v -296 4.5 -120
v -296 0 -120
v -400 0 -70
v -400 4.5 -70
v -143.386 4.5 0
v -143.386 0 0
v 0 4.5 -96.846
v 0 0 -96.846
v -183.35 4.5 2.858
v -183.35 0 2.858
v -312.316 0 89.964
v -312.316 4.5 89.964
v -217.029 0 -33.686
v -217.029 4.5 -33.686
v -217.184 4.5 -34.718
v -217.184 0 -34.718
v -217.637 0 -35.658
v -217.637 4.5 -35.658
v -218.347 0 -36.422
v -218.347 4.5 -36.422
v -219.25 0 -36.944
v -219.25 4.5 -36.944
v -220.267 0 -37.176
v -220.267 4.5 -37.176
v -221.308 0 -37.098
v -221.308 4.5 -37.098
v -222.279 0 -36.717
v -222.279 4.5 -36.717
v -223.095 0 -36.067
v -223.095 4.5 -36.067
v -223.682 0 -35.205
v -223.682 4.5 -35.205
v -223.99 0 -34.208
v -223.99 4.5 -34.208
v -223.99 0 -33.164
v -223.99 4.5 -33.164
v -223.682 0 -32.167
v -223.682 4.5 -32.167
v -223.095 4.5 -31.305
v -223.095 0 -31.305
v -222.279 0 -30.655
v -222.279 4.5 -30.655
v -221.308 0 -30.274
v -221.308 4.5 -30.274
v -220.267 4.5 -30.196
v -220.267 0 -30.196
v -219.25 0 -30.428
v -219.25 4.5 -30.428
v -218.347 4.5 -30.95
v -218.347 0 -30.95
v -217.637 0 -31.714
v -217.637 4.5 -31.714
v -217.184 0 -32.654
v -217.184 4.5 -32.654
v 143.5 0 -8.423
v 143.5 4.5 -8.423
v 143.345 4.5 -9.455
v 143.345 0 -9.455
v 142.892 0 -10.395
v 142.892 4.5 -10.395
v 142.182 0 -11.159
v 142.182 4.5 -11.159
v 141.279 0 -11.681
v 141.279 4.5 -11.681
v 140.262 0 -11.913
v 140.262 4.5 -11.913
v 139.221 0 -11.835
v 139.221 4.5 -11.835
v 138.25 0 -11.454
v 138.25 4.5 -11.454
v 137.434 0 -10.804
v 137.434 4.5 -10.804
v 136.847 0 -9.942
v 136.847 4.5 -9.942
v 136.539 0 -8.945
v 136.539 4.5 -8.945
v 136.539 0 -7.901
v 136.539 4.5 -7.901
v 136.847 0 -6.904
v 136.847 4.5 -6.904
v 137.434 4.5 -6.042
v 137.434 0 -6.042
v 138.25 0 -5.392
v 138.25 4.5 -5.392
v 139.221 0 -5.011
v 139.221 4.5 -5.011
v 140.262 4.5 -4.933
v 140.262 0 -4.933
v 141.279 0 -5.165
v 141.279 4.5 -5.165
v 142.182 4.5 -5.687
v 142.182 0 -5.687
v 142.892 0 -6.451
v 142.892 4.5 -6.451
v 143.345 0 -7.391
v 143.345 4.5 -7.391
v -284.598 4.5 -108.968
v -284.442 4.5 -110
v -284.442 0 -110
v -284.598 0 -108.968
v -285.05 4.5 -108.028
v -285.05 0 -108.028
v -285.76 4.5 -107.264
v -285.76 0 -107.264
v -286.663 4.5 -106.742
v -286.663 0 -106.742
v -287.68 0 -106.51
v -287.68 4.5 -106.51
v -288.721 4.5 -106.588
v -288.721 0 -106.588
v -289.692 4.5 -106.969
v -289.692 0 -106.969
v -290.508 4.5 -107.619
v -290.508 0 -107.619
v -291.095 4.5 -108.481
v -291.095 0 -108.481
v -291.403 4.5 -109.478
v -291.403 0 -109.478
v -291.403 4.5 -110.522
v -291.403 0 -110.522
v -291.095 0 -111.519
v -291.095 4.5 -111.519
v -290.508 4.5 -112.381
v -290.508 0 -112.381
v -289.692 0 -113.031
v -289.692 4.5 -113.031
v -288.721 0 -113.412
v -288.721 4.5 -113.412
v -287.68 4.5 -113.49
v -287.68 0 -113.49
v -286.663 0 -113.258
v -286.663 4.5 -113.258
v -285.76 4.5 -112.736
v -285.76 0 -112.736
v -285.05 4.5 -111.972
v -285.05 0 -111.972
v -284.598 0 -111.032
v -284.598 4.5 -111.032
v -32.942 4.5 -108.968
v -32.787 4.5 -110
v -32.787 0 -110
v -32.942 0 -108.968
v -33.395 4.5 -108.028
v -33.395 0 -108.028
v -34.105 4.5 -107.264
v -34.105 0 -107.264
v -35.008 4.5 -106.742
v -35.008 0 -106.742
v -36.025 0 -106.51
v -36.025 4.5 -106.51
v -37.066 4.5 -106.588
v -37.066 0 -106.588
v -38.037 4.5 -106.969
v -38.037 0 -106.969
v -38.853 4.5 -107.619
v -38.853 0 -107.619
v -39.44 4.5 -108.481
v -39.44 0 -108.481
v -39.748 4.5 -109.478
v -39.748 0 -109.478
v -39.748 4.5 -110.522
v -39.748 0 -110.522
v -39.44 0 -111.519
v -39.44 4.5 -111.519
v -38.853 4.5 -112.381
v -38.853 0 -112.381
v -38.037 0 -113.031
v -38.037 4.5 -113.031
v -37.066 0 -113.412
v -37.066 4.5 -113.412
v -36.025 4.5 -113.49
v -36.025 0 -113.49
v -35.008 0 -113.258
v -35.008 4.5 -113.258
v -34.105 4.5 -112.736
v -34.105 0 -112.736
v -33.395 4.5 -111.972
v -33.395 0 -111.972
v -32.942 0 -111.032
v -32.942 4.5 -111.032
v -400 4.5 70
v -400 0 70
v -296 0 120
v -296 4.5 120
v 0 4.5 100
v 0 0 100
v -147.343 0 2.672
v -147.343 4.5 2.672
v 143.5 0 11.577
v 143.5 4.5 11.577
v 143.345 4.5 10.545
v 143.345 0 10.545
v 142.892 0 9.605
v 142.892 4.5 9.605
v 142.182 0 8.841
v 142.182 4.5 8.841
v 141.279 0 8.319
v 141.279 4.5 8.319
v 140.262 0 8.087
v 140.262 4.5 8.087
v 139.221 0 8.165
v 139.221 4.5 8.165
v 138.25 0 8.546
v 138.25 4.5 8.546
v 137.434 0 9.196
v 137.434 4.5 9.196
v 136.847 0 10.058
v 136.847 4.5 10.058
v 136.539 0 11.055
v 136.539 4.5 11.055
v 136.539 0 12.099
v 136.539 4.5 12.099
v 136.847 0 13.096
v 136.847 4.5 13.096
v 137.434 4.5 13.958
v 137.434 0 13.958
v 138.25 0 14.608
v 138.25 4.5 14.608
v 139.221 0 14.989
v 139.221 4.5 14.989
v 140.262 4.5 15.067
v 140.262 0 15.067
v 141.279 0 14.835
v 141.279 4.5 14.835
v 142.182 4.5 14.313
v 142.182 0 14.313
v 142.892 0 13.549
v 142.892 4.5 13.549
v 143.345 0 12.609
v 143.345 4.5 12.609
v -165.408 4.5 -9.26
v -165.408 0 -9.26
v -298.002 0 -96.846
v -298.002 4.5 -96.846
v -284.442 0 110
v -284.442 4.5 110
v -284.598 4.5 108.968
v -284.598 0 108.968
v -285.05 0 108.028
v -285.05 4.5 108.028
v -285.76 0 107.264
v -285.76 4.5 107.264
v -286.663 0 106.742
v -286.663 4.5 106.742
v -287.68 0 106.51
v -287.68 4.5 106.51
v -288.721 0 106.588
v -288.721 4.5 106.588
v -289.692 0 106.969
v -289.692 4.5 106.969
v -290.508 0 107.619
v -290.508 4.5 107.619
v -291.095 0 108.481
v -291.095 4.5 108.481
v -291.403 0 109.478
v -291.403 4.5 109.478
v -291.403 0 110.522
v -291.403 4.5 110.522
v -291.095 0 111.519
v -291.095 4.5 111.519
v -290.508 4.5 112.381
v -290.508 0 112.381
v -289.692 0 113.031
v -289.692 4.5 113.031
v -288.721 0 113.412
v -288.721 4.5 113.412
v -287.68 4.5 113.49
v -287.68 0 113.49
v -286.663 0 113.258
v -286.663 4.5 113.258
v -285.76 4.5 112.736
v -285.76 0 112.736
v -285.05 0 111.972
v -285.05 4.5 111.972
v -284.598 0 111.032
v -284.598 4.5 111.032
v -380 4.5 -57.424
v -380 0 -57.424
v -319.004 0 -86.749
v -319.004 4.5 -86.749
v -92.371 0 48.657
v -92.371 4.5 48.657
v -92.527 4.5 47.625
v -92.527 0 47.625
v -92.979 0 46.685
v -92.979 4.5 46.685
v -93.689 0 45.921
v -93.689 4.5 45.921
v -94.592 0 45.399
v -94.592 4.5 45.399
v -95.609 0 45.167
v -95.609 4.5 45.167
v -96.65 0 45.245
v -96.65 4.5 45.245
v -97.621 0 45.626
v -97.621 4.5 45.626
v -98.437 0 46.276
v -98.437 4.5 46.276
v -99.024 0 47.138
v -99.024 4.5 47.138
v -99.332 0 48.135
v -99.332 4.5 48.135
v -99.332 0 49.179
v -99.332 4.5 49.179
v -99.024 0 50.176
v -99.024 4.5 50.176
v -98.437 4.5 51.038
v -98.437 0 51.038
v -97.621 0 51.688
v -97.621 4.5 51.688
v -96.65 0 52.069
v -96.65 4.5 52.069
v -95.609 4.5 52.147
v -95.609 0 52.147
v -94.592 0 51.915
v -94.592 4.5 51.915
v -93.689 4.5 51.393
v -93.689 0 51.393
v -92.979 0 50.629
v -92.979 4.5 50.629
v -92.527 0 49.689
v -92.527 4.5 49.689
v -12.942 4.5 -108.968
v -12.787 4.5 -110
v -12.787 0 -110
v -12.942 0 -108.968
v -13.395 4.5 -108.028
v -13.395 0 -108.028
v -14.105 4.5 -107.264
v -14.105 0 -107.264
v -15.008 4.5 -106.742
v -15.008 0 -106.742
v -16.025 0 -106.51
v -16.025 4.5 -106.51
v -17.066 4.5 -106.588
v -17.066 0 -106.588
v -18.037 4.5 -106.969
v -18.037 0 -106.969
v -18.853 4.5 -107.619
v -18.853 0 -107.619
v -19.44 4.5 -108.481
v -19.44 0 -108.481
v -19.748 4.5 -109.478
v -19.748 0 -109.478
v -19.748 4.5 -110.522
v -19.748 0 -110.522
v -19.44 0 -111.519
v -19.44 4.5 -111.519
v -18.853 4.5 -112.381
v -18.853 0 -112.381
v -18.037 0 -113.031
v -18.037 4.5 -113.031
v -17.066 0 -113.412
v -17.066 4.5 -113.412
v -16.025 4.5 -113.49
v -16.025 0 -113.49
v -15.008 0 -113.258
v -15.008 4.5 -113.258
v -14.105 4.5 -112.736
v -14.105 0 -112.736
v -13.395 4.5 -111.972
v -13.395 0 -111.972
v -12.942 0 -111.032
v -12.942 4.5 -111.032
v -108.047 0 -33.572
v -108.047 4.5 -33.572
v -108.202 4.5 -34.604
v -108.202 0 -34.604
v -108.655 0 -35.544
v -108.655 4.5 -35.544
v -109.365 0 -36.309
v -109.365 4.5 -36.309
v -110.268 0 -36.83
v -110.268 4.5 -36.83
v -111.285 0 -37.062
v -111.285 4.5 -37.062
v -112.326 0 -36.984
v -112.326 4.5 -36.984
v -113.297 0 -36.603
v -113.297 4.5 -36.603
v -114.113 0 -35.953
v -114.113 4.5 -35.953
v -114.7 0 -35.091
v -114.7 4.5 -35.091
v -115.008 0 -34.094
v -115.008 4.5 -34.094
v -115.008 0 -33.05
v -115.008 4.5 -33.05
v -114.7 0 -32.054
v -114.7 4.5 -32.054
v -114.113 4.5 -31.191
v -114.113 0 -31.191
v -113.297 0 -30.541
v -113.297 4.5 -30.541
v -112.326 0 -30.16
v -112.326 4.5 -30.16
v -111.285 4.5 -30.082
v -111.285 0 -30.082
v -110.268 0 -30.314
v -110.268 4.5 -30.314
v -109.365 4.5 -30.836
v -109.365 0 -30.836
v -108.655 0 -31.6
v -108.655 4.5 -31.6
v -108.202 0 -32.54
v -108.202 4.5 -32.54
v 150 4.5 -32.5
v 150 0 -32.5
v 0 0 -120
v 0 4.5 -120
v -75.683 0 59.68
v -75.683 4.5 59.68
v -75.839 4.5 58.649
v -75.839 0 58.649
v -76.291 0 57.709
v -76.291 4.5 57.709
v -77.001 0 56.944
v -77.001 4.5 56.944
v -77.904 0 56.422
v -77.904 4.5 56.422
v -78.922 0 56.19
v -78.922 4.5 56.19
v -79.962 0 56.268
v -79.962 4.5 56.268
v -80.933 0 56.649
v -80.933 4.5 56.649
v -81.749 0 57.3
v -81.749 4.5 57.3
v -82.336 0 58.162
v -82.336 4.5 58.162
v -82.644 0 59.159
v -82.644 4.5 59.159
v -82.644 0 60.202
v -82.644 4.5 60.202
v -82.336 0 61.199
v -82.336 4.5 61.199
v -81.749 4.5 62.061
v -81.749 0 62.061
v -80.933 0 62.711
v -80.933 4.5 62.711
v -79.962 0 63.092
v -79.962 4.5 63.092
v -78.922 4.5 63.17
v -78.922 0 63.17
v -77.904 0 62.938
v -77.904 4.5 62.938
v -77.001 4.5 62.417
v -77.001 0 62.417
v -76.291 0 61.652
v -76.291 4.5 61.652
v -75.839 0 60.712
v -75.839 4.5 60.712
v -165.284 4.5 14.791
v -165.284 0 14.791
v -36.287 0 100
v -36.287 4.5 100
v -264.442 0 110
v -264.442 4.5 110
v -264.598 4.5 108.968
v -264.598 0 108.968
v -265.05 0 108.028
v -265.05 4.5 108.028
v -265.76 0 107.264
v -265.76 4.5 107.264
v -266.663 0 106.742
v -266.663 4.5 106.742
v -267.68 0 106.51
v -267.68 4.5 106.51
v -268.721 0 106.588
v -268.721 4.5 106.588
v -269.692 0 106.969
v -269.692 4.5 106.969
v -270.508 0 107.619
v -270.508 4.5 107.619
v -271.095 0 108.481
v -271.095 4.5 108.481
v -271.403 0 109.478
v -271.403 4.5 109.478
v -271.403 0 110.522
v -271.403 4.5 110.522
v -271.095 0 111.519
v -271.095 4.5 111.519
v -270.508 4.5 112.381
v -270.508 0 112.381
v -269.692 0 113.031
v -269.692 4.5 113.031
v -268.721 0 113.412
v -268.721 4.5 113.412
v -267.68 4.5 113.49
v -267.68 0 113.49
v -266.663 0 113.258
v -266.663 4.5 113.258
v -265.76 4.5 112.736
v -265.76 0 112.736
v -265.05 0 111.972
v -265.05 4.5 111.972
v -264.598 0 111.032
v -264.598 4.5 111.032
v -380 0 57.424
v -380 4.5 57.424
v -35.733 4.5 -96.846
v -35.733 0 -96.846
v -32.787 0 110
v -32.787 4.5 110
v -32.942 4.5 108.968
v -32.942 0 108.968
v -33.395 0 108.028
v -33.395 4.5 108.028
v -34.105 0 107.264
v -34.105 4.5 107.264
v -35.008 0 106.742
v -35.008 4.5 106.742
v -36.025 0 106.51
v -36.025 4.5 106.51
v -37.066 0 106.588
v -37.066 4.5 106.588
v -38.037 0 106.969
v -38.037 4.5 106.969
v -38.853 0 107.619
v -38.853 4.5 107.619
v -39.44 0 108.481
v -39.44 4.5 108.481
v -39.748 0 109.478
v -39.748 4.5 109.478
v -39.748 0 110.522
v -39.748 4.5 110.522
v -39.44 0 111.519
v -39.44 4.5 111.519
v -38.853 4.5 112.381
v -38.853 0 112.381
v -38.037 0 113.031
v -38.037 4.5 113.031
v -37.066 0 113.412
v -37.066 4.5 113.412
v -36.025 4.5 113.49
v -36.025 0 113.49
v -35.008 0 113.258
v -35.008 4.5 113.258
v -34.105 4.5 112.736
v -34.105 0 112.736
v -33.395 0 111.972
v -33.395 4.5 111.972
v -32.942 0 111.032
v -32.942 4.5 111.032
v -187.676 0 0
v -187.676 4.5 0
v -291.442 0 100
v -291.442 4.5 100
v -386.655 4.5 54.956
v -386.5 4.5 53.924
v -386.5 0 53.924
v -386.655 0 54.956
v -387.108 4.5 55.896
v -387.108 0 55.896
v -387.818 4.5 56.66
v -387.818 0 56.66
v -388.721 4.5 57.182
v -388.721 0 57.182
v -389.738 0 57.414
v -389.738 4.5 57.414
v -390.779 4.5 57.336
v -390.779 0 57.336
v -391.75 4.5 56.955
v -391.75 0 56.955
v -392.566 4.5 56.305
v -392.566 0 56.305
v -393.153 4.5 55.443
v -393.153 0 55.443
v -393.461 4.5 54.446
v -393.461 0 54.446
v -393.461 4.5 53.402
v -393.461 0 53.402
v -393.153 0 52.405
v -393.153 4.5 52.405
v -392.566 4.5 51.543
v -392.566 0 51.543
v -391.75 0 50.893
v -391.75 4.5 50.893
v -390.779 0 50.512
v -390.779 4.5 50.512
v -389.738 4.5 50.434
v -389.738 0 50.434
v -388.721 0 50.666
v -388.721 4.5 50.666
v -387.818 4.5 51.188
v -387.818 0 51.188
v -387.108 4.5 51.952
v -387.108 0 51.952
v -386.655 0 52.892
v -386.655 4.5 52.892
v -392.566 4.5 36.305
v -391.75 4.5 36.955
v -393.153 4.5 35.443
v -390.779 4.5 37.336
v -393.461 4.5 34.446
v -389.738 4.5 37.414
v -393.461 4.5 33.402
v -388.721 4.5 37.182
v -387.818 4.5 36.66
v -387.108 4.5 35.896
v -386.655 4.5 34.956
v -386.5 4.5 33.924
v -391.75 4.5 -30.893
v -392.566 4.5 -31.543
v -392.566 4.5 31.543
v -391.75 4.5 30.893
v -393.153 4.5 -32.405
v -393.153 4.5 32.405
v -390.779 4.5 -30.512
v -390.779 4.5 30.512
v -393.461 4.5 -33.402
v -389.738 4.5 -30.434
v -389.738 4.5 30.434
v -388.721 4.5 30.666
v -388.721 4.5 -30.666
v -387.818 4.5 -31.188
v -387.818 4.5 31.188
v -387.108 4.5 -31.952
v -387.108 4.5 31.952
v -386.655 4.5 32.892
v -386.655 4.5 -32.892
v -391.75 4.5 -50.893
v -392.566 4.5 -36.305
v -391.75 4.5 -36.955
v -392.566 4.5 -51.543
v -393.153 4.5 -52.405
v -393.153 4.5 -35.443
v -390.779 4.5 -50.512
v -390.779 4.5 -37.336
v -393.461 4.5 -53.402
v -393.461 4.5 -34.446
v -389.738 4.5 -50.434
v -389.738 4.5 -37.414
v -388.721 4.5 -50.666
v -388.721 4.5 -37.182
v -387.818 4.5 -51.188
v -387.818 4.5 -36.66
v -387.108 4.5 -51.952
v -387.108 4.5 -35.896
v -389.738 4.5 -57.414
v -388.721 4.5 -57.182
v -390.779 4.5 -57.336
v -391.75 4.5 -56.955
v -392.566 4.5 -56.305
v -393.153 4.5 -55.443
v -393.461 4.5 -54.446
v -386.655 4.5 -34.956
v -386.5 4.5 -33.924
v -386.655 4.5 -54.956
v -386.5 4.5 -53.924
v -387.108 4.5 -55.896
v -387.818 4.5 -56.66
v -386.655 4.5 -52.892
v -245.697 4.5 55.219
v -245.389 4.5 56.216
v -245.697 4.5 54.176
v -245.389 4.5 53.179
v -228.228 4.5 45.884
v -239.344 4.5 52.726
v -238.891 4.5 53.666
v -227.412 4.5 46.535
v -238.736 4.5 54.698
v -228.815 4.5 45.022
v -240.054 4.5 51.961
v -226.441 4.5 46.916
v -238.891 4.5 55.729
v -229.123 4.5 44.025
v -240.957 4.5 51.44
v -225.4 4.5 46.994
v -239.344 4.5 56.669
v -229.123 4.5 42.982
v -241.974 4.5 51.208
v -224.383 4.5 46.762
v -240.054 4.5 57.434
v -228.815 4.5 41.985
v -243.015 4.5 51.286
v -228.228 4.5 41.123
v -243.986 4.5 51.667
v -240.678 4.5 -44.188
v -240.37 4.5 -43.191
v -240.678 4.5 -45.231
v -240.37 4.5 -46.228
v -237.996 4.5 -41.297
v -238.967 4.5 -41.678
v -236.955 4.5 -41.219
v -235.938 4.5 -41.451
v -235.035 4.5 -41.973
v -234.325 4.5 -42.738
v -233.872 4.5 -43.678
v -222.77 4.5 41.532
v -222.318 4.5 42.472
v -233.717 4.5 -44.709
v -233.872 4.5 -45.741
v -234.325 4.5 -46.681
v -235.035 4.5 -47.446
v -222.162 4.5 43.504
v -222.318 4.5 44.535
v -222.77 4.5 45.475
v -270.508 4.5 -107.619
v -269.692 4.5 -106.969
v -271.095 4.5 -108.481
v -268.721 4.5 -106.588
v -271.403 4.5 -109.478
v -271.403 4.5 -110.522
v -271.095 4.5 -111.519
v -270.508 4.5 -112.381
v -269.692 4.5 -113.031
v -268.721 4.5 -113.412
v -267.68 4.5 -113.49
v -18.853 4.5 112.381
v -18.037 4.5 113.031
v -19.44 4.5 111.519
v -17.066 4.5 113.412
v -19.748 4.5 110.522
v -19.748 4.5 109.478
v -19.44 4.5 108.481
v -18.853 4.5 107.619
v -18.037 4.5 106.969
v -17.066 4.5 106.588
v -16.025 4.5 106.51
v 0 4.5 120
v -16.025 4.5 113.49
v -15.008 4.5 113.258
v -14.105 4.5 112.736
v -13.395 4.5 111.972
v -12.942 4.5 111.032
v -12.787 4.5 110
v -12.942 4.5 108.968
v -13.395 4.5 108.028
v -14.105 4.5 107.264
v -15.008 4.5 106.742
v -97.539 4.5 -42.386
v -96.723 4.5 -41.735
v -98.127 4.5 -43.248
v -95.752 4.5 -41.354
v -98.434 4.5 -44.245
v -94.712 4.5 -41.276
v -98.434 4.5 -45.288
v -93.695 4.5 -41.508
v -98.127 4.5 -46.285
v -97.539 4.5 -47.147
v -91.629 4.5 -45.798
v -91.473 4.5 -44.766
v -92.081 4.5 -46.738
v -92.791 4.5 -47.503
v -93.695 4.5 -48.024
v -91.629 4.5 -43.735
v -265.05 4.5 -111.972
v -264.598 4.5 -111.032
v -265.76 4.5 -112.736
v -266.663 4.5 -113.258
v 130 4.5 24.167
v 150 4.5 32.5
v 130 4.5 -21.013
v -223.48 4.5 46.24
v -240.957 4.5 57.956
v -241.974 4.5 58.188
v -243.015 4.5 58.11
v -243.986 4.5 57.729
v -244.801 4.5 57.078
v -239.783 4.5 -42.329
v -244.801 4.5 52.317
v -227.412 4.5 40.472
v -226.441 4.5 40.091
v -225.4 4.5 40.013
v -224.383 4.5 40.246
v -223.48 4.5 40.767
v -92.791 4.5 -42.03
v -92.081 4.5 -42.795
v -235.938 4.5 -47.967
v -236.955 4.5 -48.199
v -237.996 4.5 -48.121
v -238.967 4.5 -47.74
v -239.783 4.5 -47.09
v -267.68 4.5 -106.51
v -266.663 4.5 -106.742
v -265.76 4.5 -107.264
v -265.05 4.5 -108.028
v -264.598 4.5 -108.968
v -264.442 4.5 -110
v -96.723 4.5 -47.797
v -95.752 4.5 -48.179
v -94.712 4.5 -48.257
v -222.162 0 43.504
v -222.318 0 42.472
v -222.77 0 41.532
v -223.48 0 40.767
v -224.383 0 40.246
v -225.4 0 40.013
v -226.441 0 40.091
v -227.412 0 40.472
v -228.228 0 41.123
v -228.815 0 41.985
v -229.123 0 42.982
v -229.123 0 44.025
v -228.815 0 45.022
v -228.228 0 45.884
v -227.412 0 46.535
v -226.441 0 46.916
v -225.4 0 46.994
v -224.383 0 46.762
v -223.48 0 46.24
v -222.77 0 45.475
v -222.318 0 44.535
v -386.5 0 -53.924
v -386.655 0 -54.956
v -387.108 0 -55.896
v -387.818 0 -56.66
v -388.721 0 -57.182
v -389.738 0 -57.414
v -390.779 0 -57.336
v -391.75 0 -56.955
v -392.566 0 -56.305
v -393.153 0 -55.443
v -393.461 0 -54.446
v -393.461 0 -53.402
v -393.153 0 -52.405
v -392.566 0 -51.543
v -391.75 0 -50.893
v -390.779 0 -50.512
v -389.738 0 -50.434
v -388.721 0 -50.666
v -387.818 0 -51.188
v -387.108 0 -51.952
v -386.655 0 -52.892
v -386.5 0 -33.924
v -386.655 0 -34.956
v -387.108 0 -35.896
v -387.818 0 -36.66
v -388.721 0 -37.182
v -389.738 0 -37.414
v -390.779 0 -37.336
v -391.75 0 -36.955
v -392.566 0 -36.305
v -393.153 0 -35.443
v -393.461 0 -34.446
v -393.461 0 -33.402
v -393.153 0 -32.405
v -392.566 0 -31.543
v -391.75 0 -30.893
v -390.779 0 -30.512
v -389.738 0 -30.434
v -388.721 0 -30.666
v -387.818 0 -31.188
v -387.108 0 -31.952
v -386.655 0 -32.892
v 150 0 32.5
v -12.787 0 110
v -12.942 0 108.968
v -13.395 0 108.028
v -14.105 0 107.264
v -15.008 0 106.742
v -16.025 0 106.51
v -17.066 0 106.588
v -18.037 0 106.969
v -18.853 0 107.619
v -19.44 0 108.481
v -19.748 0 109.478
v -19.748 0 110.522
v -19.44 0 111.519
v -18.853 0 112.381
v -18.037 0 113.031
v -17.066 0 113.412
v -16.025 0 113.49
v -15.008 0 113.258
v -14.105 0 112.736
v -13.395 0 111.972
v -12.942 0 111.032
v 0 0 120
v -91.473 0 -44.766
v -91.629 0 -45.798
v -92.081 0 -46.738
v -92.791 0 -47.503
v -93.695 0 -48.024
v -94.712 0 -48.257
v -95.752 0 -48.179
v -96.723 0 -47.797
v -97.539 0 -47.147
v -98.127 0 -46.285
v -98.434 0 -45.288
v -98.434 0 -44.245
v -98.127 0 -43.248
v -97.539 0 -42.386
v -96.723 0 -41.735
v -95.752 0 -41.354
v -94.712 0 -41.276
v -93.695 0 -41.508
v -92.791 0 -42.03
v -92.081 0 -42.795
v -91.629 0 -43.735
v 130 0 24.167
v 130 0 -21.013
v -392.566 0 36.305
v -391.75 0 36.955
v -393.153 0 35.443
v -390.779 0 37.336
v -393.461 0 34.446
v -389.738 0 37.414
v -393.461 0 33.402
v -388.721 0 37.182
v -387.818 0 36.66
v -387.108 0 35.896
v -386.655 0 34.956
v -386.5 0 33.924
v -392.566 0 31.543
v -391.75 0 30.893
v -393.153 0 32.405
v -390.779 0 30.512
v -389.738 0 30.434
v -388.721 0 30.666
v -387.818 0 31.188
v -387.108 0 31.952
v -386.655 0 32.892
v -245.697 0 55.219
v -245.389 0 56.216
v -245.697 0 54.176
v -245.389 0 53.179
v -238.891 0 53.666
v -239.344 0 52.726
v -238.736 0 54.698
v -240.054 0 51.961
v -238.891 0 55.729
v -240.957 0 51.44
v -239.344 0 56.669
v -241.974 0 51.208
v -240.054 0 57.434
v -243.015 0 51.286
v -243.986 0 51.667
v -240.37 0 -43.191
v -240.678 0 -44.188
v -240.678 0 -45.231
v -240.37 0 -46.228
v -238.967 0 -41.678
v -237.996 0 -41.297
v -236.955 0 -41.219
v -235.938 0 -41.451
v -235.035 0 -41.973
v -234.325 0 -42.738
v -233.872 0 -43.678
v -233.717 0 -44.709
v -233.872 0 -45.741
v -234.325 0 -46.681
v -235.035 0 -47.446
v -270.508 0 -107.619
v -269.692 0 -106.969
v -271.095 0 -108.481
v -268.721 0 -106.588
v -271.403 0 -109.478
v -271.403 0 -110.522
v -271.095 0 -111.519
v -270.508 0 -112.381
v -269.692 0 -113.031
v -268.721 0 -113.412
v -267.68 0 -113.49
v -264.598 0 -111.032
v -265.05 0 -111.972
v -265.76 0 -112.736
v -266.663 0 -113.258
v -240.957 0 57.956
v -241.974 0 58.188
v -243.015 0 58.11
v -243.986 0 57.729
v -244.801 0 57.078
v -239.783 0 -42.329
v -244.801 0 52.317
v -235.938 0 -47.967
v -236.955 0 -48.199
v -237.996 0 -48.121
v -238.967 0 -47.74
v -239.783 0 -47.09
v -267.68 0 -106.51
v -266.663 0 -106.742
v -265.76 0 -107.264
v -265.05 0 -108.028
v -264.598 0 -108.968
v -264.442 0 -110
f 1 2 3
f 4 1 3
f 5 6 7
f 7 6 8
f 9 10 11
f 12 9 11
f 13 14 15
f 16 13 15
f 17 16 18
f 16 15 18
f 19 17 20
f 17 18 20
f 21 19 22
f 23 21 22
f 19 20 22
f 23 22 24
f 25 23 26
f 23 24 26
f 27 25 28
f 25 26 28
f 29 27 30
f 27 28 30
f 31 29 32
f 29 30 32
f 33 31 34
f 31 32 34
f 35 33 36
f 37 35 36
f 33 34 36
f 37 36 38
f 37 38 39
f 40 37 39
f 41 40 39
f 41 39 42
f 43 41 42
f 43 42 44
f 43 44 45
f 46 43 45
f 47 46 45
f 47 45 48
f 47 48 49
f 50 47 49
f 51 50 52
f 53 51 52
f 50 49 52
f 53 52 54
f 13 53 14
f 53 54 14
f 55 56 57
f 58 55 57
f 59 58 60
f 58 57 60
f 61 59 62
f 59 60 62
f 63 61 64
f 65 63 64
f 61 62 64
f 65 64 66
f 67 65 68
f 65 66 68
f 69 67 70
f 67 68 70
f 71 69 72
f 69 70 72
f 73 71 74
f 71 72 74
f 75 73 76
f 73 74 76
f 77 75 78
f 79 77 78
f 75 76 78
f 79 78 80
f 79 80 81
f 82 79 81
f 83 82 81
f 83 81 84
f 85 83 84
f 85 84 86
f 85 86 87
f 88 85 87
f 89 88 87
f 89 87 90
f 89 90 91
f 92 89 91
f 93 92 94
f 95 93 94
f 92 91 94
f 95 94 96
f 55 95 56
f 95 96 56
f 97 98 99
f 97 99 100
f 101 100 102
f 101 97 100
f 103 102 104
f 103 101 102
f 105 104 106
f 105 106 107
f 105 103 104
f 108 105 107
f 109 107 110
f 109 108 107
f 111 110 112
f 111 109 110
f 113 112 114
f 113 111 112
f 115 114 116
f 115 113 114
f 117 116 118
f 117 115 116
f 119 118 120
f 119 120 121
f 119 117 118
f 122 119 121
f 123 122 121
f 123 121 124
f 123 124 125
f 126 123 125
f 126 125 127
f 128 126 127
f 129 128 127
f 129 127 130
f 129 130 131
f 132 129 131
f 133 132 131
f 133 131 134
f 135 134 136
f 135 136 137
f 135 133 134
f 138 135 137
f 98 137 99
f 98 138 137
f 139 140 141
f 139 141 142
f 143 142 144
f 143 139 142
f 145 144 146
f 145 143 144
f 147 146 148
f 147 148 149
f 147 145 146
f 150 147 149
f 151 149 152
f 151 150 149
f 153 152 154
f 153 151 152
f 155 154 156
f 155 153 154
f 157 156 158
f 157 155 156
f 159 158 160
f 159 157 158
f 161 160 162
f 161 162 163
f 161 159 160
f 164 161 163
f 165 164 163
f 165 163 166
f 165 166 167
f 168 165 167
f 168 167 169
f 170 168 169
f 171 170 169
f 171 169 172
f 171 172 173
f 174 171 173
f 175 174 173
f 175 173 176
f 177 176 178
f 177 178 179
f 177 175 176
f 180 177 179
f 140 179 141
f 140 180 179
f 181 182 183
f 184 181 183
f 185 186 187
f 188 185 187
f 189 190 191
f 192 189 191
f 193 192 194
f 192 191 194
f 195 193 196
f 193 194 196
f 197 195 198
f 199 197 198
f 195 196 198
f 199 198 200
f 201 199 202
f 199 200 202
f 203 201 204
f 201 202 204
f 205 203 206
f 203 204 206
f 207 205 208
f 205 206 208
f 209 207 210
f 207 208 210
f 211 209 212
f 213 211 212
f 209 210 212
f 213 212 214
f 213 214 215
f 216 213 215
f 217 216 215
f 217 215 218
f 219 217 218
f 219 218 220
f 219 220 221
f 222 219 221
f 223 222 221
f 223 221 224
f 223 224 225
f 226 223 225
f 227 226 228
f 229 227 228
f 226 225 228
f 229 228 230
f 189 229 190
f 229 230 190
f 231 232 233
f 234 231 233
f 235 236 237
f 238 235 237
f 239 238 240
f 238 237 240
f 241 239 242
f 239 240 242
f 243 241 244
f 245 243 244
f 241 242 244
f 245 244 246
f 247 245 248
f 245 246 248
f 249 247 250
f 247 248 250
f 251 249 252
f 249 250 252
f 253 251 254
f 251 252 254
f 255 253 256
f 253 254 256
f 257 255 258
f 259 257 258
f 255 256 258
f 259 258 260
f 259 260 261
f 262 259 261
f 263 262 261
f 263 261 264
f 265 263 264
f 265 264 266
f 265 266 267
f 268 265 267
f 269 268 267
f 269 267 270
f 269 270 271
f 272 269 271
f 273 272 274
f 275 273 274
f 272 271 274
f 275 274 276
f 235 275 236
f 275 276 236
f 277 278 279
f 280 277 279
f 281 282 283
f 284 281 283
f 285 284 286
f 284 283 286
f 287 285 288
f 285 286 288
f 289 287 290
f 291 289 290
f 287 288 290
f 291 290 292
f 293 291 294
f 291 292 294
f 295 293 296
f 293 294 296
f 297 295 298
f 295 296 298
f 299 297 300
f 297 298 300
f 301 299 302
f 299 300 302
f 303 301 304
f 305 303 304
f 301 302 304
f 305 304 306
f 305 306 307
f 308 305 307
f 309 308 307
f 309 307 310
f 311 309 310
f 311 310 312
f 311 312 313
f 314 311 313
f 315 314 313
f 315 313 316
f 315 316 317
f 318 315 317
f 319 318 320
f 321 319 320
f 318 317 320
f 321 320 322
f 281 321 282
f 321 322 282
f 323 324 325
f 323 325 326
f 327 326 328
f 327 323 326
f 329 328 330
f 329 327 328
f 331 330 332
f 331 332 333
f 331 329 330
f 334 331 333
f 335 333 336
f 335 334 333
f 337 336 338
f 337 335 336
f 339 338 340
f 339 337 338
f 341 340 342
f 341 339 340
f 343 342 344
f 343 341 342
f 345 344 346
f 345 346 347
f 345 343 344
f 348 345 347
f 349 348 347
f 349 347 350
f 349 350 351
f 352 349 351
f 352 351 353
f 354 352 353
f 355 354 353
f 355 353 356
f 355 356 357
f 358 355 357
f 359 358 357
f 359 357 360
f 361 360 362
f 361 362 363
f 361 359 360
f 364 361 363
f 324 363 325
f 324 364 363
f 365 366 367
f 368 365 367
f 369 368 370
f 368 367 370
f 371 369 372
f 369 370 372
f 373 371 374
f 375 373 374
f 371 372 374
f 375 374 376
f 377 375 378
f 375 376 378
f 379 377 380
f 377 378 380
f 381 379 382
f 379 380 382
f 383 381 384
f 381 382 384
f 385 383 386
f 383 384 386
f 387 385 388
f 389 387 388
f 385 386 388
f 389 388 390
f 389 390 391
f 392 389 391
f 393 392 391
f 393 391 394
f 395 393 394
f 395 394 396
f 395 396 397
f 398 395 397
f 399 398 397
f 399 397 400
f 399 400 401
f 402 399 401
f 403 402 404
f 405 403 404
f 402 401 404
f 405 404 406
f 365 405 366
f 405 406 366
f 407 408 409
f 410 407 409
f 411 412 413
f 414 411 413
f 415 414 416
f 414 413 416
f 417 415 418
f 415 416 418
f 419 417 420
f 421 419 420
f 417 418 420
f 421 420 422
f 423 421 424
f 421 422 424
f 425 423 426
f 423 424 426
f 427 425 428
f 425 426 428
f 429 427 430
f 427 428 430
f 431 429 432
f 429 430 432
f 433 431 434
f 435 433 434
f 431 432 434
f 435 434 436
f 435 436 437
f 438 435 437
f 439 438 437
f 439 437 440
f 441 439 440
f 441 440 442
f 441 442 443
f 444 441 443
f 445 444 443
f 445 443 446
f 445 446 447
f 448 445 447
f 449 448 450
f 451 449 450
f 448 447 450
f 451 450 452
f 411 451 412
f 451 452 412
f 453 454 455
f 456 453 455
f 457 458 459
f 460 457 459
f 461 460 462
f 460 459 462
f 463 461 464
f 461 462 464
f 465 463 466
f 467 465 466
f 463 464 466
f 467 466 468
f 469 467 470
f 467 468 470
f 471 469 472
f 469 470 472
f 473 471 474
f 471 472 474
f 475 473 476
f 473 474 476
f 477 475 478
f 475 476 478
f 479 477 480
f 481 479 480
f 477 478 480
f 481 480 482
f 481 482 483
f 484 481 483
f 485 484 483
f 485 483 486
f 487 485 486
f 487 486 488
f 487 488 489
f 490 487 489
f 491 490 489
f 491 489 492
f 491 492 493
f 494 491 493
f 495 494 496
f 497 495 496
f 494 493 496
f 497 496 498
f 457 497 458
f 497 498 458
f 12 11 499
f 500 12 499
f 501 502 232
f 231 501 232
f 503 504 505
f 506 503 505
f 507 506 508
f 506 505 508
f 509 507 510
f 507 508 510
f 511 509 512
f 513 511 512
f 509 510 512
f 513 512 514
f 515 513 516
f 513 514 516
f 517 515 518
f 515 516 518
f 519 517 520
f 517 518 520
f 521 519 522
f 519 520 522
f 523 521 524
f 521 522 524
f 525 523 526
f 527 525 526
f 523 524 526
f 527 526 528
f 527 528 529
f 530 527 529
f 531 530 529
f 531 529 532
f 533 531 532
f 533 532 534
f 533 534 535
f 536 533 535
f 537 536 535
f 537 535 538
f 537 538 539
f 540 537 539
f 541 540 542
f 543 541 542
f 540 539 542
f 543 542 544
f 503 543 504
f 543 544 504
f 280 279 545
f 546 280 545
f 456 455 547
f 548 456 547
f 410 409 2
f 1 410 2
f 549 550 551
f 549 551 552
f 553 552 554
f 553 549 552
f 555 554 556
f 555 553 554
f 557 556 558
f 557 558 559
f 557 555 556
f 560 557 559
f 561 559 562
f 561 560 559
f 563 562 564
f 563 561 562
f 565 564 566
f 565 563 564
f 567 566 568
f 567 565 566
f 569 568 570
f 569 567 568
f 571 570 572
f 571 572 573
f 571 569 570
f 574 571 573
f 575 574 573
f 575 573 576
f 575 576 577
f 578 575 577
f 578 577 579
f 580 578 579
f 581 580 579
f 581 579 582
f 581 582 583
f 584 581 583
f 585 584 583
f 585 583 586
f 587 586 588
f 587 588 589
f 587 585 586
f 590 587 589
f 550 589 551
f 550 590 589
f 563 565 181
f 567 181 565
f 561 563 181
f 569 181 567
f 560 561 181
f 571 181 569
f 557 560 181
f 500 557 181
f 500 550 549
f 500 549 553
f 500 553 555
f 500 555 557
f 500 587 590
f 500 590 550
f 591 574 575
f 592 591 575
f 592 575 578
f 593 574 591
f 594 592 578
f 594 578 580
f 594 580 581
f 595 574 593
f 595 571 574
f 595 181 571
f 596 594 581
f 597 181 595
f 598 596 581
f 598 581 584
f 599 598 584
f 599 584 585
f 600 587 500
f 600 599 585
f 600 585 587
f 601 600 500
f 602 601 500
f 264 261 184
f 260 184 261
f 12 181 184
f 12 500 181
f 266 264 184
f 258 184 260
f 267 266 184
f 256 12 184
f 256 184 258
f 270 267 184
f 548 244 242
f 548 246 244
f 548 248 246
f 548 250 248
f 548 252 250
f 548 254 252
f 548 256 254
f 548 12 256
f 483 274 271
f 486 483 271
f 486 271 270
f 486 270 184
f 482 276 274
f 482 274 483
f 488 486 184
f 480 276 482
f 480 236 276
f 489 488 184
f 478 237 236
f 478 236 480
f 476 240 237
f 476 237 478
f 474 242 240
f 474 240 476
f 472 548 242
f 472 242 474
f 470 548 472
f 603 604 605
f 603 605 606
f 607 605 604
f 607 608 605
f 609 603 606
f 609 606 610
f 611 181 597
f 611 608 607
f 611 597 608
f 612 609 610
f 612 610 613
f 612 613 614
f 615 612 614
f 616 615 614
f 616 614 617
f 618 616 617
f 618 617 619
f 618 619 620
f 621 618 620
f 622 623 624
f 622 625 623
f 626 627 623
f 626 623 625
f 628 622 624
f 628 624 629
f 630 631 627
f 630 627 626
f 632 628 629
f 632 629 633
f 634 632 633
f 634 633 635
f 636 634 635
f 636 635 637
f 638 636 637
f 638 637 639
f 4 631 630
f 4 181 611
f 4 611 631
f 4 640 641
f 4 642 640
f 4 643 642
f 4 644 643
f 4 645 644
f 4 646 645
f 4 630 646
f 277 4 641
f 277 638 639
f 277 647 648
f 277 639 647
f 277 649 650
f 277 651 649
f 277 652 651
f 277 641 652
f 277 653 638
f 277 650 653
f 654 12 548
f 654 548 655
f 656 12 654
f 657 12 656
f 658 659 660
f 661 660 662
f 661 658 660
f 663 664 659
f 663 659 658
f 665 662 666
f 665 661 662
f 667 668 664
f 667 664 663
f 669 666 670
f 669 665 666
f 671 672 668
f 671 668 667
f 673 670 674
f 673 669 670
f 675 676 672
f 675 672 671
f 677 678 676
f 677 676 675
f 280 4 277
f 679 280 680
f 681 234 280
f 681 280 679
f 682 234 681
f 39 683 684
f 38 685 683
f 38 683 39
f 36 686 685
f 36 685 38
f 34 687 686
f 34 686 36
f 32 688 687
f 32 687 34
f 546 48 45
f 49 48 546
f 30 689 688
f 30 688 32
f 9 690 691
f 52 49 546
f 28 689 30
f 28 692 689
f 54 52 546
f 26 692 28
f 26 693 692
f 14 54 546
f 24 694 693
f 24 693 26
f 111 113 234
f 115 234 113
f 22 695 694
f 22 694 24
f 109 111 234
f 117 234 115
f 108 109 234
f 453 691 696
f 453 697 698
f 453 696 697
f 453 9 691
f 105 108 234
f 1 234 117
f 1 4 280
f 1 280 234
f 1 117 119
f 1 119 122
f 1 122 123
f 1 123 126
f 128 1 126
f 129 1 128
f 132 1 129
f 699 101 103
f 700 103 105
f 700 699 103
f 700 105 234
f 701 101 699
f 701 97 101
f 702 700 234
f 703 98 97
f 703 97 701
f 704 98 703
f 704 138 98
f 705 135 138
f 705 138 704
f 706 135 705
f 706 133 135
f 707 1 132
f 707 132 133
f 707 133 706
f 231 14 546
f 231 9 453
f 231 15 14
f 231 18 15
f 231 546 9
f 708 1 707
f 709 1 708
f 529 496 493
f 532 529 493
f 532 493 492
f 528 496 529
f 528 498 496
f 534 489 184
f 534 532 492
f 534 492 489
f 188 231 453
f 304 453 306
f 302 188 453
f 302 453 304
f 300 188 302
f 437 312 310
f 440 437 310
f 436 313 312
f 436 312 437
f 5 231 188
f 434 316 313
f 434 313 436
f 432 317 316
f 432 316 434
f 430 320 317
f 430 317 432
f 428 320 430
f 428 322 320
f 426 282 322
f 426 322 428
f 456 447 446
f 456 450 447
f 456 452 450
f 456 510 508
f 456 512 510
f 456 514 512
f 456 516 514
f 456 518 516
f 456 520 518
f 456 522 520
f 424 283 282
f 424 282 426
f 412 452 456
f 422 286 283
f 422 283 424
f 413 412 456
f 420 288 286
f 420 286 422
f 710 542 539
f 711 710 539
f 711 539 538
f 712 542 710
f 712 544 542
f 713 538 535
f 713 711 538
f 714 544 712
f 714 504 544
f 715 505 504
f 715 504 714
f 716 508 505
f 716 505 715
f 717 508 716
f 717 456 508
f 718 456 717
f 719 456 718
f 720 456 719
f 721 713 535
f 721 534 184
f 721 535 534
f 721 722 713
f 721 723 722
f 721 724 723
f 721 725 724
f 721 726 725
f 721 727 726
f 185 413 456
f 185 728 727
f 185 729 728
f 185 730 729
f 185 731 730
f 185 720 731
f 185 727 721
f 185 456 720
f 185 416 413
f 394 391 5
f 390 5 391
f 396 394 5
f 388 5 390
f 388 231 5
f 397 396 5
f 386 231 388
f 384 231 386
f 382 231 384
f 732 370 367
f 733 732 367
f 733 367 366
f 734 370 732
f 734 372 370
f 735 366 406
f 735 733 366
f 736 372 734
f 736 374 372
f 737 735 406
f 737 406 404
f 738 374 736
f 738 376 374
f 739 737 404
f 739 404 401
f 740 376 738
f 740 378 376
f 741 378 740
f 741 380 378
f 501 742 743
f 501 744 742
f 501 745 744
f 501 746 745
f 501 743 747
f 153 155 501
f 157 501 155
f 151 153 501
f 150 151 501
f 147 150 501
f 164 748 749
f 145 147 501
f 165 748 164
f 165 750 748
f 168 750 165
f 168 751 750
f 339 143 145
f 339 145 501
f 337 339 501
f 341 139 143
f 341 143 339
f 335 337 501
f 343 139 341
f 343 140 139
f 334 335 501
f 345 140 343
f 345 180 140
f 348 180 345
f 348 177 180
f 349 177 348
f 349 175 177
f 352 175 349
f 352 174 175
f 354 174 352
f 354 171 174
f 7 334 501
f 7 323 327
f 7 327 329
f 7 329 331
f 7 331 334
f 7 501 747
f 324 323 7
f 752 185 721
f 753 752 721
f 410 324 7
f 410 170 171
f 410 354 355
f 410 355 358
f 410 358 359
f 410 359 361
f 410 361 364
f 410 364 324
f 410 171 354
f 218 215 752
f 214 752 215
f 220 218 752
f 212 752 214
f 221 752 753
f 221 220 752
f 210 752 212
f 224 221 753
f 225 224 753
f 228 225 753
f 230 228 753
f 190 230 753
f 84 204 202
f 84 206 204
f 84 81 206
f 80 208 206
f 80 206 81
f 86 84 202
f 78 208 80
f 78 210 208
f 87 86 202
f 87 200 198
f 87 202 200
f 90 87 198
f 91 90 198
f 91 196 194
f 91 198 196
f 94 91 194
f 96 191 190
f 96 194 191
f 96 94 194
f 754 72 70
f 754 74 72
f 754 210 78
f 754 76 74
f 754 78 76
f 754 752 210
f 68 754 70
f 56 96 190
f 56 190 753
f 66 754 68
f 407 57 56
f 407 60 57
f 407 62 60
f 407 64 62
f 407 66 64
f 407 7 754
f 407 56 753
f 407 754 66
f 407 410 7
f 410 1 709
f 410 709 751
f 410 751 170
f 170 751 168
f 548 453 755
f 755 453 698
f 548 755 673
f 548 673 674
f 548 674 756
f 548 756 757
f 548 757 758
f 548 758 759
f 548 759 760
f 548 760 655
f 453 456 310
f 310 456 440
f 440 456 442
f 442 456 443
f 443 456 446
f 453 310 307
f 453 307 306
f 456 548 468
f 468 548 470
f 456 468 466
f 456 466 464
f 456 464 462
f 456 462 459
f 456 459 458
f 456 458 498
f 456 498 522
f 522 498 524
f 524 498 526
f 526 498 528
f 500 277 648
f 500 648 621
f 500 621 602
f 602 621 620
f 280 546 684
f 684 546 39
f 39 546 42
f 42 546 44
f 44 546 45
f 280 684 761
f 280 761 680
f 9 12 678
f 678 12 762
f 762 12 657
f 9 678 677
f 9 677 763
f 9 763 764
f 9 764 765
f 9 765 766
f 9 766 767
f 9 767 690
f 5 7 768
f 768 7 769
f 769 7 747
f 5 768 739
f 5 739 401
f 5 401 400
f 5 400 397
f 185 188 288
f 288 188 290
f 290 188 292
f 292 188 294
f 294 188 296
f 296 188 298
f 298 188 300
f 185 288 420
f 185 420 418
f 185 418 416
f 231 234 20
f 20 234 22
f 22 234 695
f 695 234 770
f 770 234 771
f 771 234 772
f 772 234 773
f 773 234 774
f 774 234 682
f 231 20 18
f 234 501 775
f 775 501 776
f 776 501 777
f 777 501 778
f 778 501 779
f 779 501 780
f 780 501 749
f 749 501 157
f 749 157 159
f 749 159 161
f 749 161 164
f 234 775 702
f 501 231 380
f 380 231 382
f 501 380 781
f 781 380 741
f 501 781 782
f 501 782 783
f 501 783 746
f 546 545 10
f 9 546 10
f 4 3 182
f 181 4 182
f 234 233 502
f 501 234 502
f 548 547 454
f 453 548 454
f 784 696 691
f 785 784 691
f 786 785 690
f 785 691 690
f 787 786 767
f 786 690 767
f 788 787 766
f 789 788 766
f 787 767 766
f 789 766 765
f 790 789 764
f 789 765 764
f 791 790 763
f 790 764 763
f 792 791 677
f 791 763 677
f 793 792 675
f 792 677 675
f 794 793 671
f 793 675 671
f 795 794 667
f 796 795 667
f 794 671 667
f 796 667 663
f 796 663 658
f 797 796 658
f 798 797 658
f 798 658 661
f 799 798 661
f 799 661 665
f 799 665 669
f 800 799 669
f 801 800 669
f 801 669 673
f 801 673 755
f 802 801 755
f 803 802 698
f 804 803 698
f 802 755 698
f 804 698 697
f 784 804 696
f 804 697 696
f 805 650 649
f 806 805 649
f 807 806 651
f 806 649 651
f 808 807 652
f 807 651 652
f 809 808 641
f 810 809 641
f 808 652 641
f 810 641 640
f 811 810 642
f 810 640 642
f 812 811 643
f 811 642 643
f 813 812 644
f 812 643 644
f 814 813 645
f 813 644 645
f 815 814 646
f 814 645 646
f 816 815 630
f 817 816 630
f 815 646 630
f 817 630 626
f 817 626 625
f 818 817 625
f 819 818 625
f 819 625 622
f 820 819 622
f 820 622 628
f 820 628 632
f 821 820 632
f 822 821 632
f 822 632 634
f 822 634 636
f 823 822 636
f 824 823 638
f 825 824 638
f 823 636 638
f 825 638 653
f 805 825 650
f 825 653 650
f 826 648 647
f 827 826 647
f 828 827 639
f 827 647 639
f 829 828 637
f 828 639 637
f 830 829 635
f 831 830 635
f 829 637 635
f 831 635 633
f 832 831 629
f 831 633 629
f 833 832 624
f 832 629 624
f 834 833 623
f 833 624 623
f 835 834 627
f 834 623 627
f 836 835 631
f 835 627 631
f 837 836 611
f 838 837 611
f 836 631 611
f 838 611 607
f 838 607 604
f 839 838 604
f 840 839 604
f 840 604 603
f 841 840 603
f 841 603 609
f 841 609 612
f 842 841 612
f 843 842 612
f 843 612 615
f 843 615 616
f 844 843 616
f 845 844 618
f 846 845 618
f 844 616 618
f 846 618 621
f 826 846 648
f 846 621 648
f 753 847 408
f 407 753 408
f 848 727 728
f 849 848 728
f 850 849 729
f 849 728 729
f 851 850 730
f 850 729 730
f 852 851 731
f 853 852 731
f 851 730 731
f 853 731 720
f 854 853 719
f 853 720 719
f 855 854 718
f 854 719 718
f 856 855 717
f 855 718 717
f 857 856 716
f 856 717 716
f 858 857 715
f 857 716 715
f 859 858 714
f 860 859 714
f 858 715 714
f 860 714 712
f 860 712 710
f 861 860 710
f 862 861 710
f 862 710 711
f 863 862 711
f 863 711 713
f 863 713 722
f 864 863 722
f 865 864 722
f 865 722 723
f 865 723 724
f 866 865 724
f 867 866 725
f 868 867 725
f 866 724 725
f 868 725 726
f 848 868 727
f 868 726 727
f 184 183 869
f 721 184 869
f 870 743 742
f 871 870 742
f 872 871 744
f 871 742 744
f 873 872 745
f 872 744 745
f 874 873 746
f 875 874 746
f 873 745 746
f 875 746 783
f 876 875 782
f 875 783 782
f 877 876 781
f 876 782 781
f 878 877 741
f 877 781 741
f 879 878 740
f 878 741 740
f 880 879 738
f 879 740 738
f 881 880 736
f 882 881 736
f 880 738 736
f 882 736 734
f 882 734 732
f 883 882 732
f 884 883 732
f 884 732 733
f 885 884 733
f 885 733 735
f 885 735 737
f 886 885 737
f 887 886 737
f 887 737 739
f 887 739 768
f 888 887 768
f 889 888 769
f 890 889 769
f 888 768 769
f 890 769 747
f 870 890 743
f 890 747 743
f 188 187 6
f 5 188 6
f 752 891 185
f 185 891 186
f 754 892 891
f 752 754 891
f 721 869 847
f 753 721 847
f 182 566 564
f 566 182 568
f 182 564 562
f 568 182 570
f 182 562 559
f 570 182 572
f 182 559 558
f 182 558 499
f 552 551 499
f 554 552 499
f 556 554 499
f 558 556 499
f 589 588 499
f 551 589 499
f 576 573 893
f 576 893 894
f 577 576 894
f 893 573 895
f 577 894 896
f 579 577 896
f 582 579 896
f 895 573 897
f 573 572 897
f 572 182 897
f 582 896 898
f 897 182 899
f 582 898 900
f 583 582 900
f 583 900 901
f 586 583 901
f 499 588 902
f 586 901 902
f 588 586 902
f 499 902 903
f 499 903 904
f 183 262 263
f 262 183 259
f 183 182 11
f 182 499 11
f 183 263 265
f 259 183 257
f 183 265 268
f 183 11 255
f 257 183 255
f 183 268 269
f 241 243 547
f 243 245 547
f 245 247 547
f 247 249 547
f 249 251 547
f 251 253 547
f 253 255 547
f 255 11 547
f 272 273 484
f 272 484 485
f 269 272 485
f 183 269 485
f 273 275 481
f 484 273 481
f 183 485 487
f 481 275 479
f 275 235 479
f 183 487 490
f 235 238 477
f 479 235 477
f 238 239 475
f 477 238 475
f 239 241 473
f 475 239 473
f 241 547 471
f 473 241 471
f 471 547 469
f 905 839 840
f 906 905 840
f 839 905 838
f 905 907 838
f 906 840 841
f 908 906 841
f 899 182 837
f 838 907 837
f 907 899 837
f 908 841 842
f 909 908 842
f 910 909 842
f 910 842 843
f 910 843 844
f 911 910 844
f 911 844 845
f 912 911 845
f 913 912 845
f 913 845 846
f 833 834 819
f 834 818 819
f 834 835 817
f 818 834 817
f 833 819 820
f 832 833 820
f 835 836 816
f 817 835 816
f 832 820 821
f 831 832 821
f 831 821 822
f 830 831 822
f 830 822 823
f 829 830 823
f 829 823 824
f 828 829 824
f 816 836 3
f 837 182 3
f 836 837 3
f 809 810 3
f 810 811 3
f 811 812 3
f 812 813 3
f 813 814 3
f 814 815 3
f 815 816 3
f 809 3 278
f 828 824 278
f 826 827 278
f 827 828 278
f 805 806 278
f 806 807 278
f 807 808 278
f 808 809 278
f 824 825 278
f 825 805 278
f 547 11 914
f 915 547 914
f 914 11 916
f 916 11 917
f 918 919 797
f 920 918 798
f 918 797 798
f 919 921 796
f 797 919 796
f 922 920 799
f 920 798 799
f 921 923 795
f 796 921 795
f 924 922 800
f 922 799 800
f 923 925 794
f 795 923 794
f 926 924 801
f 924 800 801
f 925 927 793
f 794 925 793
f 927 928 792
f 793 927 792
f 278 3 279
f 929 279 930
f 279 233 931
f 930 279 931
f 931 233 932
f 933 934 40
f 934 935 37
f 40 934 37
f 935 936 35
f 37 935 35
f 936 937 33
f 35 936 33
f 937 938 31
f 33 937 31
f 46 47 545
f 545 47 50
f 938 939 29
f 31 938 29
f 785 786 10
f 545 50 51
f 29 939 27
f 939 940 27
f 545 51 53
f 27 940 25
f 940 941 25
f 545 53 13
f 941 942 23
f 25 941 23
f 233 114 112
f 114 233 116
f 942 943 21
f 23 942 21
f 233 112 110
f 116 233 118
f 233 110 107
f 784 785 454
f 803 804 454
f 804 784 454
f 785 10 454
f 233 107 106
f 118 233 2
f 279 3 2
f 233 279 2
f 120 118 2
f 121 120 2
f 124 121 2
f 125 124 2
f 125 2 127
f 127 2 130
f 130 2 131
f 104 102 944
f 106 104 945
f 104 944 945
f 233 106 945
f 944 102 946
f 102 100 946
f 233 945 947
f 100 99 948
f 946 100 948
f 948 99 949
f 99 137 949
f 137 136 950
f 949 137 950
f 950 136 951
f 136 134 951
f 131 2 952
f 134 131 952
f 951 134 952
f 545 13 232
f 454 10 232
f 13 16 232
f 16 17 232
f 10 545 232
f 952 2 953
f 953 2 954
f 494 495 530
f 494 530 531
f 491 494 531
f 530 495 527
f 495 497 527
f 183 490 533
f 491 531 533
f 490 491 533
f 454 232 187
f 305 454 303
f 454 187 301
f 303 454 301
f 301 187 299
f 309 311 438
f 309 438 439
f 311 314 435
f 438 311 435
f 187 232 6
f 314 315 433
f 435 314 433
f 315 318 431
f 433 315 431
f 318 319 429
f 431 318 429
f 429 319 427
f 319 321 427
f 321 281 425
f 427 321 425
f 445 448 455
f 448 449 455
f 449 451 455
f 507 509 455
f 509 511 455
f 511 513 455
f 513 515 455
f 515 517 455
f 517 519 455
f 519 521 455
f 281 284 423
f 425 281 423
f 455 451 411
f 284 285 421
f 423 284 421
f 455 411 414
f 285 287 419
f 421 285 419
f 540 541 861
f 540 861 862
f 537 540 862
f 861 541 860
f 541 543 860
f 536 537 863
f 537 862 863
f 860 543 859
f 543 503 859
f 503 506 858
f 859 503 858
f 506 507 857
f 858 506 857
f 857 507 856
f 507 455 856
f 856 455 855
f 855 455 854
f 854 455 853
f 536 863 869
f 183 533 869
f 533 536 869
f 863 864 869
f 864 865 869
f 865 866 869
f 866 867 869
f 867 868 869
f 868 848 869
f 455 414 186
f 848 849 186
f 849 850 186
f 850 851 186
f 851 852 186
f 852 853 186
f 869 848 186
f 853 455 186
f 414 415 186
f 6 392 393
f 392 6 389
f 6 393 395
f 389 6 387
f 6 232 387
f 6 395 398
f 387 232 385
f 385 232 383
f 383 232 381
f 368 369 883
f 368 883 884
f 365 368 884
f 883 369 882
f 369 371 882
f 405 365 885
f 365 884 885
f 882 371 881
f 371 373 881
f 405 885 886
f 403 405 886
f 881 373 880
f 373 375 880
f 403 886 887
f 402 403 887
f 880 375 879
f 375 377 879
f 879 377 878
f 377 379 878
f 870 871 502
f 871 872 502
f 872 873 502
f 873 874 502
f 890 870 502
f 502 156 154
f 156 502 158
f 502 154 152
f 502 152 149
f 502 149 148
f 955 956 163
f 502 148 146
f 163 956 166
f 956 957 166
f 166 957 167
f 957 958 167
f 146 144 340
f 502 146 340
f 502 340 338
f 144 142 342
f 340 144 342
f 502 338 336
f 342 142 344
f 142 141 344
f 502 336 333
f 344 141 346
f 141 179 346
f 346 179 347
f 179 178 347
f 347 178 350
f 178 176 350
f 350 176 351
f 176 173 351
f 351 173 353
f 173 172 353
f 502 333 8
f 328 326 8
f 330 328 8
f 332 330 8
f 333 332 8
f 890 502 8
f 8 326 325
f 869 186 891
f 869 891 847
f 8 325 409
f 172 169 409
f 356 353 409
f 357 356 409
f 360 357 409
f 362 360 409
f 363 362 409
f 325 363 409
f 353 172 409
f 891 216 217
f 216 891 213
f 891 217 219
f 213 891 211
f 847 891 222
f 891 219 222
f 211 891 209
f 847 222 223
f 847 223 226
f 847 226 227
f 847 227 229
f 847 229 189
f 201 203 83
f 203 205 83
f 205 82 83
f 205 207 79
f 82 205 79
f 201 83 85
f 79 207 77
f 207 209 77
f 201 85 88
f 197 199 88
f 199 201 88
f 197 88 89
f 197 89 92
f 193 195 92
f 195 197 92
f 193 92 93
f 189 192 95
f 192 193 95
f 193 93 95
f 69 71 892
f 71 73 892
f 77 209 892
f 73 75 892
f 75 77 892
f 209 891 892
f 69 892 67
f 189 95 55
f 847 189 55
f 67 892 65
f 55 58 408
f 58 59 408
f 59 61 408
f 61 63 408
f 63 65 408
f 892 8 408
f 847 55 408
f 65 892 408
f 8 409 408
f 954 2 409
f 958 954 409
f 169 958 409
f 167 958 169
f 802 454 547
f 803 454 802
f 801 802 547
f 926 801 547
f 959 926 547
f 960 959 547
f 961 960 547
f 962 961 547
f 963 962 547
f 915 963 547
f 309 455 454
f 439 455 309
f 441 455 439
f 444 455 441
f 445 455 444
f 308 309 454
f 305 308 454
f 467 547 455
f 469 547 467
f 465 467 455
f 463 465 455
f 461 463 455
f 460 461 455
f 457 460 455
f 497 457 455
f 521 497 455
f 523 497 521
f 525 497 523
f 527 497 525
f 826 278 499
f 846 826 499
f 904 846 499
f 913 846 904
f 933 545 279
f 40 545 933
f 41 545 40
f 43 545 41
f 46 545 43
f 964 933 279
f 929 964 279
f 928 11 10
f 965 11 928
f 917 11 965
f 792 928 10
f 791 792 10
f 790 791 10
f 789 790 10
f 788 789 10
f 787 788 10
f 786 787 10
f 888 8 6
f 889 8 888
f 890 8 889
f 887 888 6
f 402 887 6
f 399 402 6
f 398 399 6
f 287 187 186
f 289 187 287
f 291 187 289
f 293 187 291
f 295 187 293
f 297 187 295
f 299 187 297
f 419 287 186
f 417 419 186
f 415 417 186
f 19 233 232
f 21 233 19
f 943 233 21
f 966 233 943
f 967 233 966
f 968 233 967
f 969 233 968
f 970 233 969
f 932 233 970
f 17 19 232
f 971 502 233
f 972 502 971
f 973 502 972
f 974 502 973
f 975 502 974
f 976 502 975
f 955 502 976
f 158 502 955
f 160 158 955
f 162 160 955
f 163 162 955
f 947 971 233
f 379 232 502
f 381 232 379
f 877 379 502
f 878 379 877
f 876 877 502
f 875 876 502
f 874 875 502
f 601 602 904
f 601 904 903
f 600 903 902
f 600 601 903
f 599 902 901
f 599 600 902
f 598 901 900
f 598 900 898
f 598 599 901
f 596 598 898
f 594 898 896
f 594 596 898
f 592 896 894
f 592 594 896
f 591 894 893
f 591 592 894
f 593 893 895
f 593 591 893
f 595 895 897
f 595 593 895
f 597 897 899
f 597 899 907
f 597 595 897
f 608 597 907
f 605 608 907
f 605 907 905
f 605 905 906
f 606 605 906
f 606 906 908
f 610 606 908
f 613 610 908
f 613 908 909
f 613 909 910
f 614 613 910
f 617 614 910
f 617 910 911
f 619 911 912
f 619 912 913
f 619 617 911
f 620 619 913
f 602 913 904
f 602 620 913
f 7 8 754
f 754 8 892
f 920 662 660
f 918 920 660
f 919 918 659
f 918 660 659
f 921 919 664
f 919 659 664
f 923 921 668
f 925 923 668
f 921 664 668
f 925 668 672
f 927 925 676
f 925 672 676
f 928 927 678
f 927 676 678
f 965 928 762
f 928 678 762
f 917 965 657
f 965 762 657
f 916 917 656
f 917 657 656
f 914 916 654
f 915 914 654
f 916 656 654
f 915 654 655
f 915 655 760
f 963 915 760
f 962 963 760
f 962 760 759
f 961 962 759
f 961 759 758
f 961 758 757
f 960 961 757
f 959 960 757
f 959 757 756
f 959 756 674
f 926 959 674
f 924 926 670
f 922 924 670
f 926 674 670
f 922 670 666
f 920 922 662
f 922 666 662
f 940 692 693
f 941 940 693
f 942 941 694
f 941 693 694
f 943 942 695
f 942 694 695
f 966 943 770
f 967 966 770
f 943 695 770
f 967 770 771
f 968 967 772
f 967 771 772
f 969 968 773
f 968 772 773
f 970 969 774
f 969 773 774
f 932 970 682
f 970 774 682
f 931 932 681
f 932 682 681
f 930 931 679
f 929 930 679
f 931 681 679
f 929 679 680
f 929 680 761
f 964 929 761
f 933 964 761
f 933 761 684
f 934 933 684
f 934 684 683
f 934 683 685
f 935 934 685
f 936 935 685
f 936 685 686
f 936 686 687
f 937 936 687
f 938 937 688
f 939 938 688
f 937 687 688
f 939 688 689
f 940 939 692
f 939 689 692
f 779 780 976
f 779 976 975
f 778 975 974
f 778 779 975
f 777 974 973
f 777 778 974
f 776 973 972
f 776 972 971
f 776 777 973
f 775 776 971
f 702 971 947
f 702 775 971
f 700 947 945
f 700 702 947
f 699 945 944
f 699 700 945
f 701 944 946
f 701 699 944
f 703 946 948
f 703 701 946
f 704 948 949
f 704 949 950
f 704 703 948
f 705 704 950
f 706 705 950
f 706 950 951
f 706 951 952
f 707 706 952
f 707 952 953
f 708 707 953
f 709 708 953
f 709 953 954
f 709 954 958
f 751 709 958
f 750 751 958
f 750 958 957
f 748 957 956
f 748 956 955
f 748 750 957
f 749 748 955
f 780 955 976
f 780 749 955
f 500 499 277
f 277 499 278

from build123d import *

# Parameters (mm, degrees)
BOSS_EXTRUDE3_DEPTH = 4.5
SKETCH2_R           = 3.5
CUT_EXTRUDE2_DEPTH  = 4.5
SKETCH3_R           = 3.5
CUT_EXTRUDE3_DEPTH  = 4.5
SKETCH4_R           = 3.5
CUT_EXTRUDE4_DEPTH  = 4.5
SKETCH5_R           = 3.5
CUT_EXTRUDE5_DEPTH  = 4.5
SKETCH6_R           = 3.5
CUT_EXTRUDE6_DEPTH  = 4.5
SKETCH7_R           = 3.5
CUT_EXTRUDE7_DEPTH  = 4.5
SKETCH8_R           = 3.5
CUT_EXTRUDE8_DEPTH  = 4.5
SKETCH9_R           = 3.5
CUT_EXTRUDE9_DEPTH  = 4.5


with BuildPart() as part:
    # Sketch1 → Boss-Extrude3 (new body)
    with BuildSketch(Plane(origin=(0, 0, 0), x_dir=(1, 0, 0), z_dir=(0, 1, 0))):
        Polygon((-183.349573846, -2.857581752), (-179.118755434, 0), (-187.675629618, 0), align=None)
        Polygon((-179.118755434, 0), (-151.388696713, 0), (-165.408042798, 9.260497243), align=None)
        Polygon((-165.284400003, -14.790555769), (-147.342868955, -2.672476774), (-151.388696713, 0), (-179.118755434, 0), (-183.349573846, -2.857581752), align=None)
        Polygon((-147.342868955, -2.672476774), (-143.386109387, 0), (-151.388696713, 0), align=None)
        Polygon((-143.386109387, 0), (0, 96.845926684), (-35.732646047, 96.845926684), (-165.408042798, 9.260497243), (-151.388696713, 0), align=None)
        Polygon((-36.286932906, -100), (0, -100), (-147.342868955, -2.672476774), (-165.284400003, -14.790555769), align=None)
        Polygon((-165.408042798, 9.260497243), (-298.002482939, 96.845926684), (-319.003928208, 86.749077997), (-187.675629618, 0), (-179.118755434, 0), align=None)
        Polygon((-312.316233719, -89.964315732), (-291.442010442, -100), (-165.284400003, -14.790555769), (-183.349573846, -2.857581752), align=None)
        Polygon((0, -120), (0, -100), (-36.286932906, -100), (-291.442010442, -100), (-312.316233719, -89.964315732), (-380, -57.424043482), (-380, 0), (-400, 0), (-400, -70), (-296, -120), align=None)
        Polygon((130, -24.166666667), (0, -100), (0, -120), (150, -32.5), (150, 0), (130, 0), align=None)
        Polygon((0, 120), (0, 96.845926684), (130, 21.012593351), (130, 0), (150, 0), (150, 32.5), align=None)
        Polygon((-35.732646047, 96.845926684), (0, 96.845926684), (0, 120), (-296, 120), (-400, 70), (-400, 0), (-380, 0), (-380, 57.424043482), (-319.003928208, 86.749077997), (-298.002482939, 96.845926684), align=None)
    extrude(amount=BOSS_EXTRUDE3_DEPTH)

    # Sketch2 → Cut-Extrude2 (cut)
    with BuildSketch(Plane(origin=(0, 4.5, 0), x_dir=(1, 0, 0), z_dir=(0, 1, 0))):
        with Locations((-16.286932906, -110)):
            Circle(SKETCH2_R)
        with Locations((-36.286932906, -110)):
            Circle(SKETCH2_R)
    cut_extrude2 = extrude(amount=-CUT_EXTRUDE2_DEPTH, mode=Mode.SUBTRACT)

    # Mirror1: Cut-Extrude2 across plane
    add(cut_extrude2.mirror(Plane.XY), mode=Mode.SUBTRACT)

    # Sketch3 → Cut-Extrude3 (cut)
    with BuildSketch(Plane(origin=(0, 4.5, 0), x_dir=(1, 0, 0), z_dir=(0, 1, 0))):
        with Locations((-287.942010442, -110)):
            Circle(SKETCH3_R)
        with Locations((-267.942010442, -110)):
            Circle(SKETCH3_R)
    cut_extrude3 = extrude(amount=-CUT_EXTRUDE3_DEPTH, mode=Mode.SUBTRACT)

    # Mirror2: Cut-Extrude3 across plane
    add(cut_extrude3.mirror(Plane.XY), mode=Mode.SUBTRACT)

    # Sketch4 → Cut-Extrude4 (cut)
    with BuildSketch(Plane(origin=(0, 4.5, 0), x_dir=(1, 0, 0), z_dir=(0, 1, 0))):
        with Locations((140, 8.422963342)):
            Circle(SKETCH4_R)
        with Locations((140, -11.577036658)):
            Circle(SKETCH4_R)
    extrude(amount=-CUT_EXTRUDE4_DEPTH, mode=Mode.SUBTRACT)

    # Sketch5 → Cut-Extrude5 (cut)
    with BuildSketch(Plane(origin=(0, 4.5, 0), x_dir=(1, 0, 0), z_dir=(0, 1, 0))):
        with Locations((-390, 53.924043482)):
            Circle(SKETCH5_R)
        with Locations((-390, 33.924043482)):
            Circle(SKETCH5_R)
    cut_extrude5 = extrude(amount=-CUT_EXTRUDE5_DEPTH, mode=Mode.SUBTRACT)

    # Mirror3: Cut-Extrude5 across plane
    add(cut_extrude5.mirror(Plane.XY), mode=Mode.SUBTRACT)

    # Sketch6 → Cut-Extrude6 (cut)
    with BuildSketch(Plane(origin=(0, 4.5, 0), x_dir=(1, 0, 0), z_dir=(0, 1, 0))):
        with Locations((-237.21688879, 44.709233314)):
            Circle(SKETCH6_R)
        with Locations((-220.528931491, 33.685981472)):
            Circle(SKETCH6_R)
    extrude(amount=-CUT_EXTRUDE6_DEPTH, mode=Mode.SUBTRACT)

    # Sketch7 → Cut-Extrude7 (cut)
    with BuildSketch(Plane(origin=(0, 4.5, 0), x_dir=(1, 0, 0), z_dir=(0, 1, 0))):
        with Locations((-242.235781203, -54.69781901)):
            Circle(SKETCH7_R)
        with Locations((-225.662040668, -43.503573852)):
            Circle(SKETCH7_R)
    extrude(amount=-CUT_EXTRUDE7_DEPTH, mode=Mode.SUBTRACT)

    # Sketch8 → Cut-Extrude8 (cut)
    with BuildSketch(Plane(origin=(0, 4.5, 0), x_dir=(1, 0, 0), z_dir=(0, 1, 0))):
        with Locations((-94.973221843, 44.766341696)):
            Circle(SKETCH8_R)
        with Locations((-111.546962379, 33.572096538)):
            Circle(SKETCH8_R)
    extrude(amount=-CUT_EXTRUDE8_DEPTH, mode=Mode.SUBTRACT)

    # Sketch9 → Cut-Extrude9 (cut)
    with BuildSketch(Plane(origin=(0, 4.5, 0), x_dir=(1, 0, 0), z_dir=(0, 1, 0))):
        with Locations((-95.871017698, -48.656965194)):
            Circle(SKETCH9_R)
        with Locations((-79.183060399, -59.680217036)):
            Circle(SKETCH9_R)
    extrude(amount=-CUT_EXTRUDE9_DEPTH, mode=Mode.SUBTRACT)


solid = part.part
